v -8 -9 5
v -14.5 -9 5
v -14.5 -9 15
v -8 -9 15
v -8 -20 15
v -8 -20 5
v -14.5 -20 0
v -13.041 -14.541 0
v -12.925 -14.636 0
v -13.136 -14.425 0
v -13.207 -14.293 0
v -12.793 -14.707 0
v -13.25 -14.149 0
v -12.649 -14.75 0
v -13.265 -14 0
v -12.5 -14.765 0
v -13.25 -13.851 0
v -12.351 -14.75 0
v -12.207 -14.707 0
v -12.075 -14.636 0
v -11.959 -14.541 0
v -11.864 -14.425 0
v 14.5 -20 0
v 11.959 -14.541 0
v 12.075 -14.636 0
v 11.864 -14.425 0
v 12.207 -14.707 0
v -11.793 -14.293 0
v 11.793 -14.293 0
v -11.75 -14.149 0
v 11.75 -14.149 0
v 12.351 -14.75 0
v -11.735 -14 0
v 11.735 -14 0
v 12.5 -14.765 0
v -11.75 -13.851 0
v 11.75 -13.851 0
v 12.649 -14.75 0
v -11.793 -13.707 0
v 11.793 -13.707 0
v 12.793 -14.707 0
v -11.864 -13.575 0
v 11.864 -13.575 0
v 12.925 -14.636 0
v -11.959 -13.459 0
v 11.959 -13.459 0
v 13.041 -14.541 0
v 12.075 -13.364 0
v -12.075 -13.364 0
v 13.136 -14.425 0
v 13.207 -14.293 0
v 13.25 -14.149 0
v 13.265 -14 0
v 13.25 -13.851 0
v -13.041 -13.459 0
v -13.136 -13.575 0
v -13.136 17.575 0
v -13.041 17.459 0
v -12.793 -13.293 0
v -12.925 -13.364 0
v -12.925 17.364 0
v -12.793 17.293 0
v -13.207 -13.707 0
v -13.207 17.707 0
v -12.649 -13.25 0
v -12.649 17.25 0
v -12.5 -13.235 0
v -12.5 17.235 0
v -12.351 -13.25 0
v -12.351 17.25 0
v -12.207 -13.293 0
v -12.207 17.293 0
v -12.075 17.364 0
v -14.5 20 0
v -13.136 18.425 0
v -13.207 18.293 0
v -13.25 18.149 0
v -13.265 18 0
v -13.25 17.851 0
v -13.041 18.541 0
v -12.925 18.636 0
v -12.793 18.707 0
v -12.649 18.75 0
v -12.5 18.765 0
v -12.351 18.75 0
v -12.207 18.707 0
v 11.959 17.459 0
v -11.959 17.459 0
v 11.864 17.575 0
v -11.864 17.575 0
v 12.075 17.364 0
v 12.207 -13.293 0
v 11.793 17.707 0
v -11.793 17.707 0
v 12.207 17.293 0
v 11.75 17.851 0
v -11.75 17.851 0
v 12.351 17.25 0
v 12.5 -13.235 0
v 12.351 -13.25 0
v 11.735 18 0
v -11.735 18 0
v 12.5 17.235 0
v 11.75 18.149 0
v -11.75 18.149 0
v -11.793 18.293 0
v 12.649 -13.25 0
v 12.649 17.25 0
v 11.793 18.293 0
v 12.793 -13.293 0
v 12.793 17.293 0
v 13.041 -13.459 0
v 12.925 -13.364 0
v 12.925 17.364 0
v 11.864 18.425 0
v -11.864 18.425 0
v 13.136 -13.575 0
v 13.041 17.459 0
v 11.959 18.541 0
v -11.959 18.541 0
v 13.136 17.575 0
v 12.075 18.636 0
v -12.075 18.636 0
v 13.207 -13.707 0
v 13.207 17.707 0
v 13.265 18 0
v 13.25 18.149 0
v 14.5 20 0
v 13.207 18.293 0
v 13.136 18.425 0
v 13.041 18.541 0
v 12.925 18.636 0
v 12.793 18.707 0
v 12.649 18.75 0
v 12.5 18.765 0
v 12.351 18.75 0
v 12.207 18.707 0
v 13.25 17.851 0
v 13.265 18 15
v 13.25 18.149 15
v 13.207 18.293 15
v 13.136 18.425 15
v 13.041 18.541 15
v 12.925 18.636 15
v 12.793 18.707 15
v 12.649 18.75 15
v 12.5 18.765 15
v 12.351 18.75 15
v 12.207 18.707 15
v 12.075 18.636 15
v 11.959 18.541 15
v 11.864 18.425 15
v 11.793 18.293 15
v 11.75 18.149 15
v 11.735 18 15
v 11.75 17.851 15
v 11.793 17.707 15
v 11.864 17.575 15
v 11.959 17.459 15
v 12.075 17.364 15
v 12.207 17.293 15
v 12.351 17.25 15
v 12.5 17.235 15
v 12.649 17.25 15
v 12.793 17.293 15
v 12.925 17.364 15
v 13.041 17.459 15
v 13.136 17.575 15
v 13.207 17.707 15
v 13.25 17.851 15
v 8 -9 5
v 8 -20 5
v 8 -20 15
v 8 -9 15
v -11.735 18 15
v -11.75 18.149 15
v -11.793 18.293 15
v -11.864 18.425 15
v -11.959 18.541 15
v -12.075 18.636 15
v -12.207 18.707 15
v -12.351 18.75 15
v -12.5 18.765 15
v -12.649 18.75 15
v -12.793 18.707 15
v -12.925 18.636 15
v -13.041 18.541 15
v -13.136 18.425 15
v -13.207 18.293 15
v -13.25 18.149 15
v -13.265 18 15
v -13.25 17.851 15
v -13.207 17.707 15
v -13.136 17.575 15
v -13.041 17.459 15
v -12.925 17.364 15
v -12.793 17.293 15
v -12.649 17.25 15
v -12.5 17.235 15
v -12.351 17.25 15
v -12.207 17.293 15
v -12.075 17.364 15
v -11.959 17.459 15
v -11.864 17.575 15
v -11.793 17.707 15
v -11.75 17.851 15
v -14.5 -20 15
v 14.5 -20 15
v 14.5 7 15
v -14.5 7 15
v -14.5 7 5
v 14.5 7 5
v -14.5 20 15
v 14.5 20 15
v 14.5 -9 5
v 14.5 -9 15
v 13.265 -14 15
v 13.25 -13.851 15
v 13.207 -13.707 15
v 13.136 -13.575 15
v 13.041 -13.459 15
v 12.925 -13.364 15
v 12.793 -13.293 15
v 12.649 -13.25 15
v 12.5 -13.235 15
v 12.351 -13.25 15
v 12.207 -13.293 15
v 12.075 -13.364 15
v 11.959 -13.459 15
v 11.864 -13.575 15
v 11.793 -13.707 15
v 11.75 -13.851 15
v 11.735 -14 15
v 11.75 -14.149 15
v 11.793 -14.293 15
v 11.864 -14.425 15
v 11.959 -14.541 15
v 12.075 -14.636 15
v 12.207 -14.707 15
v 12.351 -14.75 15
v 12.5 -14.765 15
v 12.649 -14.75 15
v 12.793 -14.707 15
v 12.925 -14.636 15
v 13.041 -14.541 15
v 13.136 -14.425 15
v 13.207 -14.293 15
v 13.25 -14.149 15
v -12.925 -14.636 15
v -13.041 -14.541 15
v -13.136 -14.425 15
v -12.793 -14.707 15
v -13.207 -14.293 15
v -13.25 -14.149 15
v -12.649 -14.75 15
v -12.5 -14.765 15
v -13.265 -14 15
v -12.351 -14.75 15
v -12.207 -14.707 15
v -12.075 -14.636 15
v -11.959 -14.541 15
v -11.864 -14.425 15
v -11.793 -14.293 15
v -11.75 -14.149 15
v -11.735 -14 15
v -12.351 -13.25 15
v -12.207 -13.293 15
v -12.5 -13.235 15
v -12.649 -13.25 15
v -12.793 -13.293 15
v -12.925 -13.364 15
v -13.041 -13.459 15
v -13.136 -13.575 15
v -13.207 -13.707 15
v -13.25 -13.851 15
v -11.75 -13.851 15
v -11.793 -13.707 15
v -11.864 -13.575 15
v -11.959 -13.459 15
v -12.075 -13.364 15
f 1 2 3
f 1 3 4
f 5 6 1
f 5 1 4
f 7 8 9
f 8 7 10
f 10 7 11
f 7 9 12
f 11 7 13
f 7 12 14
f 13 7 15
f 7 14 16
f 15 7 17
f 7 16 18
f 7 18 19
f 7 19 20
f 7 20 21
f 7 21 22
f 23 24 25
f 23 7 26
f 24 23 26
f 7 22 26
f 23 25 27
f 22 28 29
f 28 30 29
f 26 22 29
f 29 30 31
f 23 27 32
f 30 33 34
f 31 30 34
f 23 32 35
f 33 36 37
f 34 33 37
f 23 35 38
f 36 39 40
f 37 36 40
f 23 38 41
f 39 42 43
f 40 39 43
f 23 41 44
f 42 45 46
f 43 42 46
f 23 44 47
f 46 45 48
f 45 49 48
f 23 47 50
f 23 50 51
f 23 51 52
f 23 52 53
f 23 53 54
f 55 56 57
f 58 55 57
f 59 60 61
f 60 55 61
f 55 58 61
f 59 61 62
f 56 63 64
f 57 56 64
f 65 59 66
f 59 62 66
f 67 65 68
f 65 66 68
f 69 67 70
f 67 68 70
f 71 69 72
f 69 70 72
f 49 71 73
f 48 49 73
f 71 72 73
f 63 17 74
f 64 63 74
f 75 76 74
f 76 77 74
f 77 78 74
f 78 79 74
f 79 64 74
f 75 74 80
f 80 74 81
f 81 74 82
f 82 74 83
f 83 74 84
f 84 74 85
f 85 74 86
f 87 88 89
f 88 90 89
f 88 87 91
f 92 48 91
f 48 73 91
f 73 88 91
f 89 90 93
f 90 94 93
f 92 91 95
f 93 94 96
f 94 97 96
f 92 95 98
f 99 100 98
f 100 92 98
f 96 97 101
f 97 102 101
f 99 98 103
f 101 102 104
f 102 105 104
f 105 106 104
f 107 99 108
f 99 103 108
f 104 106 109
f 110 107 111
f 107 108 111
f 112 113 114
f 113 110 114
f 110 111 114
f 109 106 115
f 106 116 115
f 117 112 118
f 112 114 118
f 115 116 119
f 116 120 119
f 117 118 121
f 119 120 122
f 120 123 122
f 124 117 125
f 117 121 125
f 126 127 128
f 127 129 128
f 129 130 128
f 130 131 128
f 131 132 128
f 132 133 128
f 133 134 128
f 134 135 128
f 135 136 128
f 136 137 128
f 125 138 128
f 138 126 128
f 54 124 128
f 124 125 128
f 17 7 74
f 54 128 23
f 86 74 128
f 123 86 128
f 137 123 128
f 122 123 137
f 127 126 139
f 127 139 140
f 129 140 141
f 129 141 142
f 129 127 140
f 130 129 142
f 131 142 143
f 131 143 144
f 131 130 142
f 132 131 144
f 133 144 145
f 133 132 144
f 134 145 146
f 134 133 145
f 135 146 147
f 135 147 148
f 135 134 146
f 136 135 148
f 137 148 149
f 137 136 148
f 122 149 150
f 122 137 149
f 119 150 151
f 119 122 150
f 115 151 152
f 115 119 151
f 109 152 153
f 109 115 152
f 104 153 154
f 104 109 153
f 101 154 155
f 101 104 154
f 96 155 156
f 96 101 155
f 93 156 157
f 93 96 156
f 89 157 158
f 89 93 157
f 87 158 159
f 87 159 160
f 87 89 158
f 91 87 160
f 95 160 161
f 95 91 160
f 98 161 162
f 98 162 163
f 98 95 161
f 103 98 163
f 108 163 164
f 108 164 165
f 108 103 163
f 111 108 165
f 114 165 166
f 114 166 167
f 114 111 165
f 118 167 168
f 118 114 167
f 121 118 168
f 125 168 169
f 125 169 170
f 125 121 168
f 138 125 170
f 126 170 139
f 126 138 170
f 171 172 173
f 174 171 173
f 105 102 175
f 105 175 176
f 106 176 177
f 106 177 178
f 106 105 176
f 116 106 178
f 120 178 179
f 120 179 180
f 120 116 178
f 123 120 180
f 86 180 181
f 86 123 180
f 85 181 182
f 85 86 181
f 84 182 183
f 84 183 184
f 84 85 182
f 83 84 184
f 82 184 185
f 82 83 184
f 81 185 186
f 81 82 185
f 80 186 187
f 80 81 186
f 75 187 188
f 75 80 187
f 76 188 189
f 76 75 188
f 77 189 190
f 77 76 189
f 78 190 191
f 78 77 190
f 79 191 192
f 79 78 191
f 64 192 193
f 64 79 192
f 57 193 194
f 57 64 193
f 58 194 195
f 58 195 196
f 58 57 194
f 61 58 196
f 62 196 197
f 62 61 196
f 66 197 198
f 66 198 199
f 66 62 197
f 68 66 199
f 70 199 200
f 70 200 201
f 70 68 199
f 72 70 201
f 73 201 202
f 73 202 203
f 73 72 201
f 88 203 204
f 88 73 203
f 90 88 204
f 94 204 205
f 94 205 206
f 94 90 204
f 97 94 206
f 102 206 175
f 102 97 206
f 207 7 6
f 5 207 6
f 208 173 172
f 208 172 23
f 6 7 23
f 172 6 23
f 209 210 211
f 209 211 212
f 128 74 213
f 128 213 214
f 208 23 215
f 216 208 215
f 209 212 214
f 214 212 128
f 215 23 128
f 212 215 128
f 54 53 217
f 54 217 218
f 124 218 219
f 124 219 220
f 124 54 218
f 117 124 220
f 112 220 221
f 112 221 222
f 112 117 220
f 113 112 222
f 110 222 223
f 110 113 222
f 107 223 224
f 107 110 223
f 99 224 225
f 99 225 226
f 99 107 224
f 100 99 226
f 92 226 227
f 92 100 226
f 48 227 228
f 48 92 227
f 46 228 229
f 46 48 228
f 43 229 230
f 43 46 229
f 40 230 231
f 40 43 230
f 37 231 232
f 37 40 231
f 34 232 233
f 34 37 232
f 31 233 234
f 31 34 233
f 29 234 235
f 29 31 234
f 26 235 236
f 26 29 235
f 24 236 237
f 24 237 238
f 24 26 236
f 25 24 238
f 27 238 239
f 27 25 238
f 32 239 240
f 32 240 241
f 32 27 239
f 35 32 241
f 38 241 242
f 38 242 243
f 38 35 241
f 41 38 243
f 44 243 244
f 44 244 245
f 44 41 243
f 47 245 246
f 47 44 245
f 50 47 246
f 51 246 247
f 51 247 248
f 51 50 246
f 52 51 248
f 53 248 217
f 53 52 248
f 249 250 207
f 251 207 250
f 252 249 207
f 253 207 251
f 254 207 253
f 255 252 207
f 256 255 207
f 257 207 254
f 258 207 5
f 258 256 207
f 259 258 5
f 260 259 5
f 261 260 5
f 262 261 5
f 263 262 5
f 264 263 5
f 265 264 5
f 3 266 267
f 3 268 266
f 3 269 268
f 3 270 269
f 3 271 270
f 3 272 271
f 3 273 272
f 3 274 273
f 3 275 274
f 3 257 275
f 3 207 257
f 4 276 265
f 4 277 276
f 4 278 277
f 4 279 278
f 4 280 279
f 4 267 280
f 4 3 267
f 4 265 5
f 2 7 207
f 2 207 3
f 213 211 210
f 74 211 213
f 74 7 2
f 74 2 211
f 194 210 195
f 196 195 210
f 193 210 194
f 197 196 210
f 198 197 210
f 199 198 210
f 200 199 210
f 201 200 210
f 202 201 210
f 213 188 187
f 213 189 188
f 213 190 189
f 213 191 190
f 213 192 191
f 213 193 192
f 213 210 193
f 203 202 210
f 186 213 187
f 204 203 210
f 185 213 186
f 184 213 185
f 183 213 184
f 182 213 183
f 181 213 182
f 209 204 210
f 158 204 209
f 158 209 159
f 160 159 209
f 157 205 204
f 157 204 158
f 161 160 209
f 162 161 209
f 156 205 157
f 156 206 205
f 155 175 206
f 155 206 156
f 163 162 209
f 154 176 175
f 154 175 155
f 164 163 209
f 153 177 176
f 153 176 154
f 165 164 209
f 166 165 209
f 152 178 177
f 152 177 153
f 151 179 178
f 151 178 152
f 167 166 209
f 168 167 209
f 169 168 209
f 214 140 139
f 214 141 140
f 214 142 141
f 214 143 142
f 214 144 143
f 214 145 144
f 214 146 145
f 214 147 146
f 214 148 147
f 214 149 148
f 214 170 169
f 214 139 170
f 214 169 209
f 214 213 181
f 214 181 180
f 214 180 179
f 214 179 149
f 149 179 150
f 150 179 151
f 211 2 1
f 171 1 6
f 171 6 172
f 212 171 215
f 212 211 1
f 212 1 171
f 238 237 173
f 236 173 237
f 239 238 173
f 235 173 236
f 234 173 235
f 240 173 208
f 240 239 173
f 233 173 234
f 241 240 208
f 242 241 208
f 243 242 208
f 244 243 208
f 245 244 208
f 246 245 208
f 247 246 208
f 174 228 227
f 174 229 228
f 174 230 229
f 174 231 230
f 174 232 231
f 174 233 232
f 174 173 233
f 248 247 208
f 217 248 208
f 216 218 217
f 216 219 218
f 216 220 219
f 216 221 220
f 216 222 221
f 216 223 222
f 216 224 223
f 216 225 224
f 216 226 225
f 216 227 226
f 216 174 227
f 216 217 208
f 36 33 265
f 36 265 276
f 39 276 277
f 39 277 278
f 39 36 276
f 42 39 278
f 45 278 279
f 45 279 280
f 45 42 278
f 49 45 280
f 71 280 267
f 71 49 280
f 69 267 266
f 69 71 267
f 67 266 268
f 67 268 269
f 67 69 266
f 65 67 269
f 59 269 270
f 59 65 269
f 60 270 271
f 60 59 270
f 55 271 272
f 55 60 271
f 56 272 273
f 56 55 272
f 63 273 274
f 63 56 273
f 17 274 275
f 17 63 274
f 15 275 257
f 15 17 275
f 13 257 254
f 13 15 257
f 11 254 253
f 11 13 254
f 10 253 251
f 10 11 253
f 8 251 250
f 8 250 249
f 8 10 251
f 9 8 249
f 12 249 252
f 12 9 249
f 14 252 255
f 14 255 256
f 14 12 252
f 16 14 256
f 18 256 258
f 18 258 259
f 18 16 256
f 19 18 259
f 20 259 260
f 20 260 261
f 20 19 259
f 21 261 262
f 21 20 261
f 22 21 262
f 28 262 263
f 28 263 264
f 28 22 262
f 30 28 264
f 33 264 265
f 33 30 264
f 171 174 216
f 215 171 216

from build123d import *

# Parameters (mm, degrees)
F0_W     = 29
F0_H     = 40
F0_R     = 0.765
F1_DEPTH = 15
F2_W     = 29
F2_H     = 16
F3_DEPTH = 10
F4_W     = 16
F4_H     = 10
F5_DEPTH = 25


with BuildPart() as f1:
    # F0 (on Top) → F1 (new body)
    with BuildSketch(Plane.XY):
        Rectangle(F0_W, F0_H)
        with Locations((-12.5, -14)):
            Circle(F0_R, mode=Mode.SUBTRACT)
        with Locations((12.5, -14)):
            Circle(F0_R, mode=Mode.SUBTRACT)
        with Locations((-12.5, 18)):
            Circle(F0_R, mode=Mode.SUBTRACT)
        with Locations((12.5, 18)):
            Circle(F0_R, mode=Mode.SUBTRACT)
    extrude(amount=F1_DEPTH)

    # F2 (on face) → F3 (cut)
    with BuildSketch(Plane.XY.offset(15)):
        with Locations((0, -1)):
            Rectangle(F2_W, F2_H)
    extrude(amount=-F3_DEPTH, mode=Mode.SUBTRACT)

    # F4 (on face) → F5 (cut)
    with BuildSketch(Plane.XZ.offset(20)):
        with Locations((0, 10)):
            Rectangle(F4_W, F4_H)
    extrude(amount=-F5_DEPTH, mode=Mode.SUBTRACT)


solid = f1.part
